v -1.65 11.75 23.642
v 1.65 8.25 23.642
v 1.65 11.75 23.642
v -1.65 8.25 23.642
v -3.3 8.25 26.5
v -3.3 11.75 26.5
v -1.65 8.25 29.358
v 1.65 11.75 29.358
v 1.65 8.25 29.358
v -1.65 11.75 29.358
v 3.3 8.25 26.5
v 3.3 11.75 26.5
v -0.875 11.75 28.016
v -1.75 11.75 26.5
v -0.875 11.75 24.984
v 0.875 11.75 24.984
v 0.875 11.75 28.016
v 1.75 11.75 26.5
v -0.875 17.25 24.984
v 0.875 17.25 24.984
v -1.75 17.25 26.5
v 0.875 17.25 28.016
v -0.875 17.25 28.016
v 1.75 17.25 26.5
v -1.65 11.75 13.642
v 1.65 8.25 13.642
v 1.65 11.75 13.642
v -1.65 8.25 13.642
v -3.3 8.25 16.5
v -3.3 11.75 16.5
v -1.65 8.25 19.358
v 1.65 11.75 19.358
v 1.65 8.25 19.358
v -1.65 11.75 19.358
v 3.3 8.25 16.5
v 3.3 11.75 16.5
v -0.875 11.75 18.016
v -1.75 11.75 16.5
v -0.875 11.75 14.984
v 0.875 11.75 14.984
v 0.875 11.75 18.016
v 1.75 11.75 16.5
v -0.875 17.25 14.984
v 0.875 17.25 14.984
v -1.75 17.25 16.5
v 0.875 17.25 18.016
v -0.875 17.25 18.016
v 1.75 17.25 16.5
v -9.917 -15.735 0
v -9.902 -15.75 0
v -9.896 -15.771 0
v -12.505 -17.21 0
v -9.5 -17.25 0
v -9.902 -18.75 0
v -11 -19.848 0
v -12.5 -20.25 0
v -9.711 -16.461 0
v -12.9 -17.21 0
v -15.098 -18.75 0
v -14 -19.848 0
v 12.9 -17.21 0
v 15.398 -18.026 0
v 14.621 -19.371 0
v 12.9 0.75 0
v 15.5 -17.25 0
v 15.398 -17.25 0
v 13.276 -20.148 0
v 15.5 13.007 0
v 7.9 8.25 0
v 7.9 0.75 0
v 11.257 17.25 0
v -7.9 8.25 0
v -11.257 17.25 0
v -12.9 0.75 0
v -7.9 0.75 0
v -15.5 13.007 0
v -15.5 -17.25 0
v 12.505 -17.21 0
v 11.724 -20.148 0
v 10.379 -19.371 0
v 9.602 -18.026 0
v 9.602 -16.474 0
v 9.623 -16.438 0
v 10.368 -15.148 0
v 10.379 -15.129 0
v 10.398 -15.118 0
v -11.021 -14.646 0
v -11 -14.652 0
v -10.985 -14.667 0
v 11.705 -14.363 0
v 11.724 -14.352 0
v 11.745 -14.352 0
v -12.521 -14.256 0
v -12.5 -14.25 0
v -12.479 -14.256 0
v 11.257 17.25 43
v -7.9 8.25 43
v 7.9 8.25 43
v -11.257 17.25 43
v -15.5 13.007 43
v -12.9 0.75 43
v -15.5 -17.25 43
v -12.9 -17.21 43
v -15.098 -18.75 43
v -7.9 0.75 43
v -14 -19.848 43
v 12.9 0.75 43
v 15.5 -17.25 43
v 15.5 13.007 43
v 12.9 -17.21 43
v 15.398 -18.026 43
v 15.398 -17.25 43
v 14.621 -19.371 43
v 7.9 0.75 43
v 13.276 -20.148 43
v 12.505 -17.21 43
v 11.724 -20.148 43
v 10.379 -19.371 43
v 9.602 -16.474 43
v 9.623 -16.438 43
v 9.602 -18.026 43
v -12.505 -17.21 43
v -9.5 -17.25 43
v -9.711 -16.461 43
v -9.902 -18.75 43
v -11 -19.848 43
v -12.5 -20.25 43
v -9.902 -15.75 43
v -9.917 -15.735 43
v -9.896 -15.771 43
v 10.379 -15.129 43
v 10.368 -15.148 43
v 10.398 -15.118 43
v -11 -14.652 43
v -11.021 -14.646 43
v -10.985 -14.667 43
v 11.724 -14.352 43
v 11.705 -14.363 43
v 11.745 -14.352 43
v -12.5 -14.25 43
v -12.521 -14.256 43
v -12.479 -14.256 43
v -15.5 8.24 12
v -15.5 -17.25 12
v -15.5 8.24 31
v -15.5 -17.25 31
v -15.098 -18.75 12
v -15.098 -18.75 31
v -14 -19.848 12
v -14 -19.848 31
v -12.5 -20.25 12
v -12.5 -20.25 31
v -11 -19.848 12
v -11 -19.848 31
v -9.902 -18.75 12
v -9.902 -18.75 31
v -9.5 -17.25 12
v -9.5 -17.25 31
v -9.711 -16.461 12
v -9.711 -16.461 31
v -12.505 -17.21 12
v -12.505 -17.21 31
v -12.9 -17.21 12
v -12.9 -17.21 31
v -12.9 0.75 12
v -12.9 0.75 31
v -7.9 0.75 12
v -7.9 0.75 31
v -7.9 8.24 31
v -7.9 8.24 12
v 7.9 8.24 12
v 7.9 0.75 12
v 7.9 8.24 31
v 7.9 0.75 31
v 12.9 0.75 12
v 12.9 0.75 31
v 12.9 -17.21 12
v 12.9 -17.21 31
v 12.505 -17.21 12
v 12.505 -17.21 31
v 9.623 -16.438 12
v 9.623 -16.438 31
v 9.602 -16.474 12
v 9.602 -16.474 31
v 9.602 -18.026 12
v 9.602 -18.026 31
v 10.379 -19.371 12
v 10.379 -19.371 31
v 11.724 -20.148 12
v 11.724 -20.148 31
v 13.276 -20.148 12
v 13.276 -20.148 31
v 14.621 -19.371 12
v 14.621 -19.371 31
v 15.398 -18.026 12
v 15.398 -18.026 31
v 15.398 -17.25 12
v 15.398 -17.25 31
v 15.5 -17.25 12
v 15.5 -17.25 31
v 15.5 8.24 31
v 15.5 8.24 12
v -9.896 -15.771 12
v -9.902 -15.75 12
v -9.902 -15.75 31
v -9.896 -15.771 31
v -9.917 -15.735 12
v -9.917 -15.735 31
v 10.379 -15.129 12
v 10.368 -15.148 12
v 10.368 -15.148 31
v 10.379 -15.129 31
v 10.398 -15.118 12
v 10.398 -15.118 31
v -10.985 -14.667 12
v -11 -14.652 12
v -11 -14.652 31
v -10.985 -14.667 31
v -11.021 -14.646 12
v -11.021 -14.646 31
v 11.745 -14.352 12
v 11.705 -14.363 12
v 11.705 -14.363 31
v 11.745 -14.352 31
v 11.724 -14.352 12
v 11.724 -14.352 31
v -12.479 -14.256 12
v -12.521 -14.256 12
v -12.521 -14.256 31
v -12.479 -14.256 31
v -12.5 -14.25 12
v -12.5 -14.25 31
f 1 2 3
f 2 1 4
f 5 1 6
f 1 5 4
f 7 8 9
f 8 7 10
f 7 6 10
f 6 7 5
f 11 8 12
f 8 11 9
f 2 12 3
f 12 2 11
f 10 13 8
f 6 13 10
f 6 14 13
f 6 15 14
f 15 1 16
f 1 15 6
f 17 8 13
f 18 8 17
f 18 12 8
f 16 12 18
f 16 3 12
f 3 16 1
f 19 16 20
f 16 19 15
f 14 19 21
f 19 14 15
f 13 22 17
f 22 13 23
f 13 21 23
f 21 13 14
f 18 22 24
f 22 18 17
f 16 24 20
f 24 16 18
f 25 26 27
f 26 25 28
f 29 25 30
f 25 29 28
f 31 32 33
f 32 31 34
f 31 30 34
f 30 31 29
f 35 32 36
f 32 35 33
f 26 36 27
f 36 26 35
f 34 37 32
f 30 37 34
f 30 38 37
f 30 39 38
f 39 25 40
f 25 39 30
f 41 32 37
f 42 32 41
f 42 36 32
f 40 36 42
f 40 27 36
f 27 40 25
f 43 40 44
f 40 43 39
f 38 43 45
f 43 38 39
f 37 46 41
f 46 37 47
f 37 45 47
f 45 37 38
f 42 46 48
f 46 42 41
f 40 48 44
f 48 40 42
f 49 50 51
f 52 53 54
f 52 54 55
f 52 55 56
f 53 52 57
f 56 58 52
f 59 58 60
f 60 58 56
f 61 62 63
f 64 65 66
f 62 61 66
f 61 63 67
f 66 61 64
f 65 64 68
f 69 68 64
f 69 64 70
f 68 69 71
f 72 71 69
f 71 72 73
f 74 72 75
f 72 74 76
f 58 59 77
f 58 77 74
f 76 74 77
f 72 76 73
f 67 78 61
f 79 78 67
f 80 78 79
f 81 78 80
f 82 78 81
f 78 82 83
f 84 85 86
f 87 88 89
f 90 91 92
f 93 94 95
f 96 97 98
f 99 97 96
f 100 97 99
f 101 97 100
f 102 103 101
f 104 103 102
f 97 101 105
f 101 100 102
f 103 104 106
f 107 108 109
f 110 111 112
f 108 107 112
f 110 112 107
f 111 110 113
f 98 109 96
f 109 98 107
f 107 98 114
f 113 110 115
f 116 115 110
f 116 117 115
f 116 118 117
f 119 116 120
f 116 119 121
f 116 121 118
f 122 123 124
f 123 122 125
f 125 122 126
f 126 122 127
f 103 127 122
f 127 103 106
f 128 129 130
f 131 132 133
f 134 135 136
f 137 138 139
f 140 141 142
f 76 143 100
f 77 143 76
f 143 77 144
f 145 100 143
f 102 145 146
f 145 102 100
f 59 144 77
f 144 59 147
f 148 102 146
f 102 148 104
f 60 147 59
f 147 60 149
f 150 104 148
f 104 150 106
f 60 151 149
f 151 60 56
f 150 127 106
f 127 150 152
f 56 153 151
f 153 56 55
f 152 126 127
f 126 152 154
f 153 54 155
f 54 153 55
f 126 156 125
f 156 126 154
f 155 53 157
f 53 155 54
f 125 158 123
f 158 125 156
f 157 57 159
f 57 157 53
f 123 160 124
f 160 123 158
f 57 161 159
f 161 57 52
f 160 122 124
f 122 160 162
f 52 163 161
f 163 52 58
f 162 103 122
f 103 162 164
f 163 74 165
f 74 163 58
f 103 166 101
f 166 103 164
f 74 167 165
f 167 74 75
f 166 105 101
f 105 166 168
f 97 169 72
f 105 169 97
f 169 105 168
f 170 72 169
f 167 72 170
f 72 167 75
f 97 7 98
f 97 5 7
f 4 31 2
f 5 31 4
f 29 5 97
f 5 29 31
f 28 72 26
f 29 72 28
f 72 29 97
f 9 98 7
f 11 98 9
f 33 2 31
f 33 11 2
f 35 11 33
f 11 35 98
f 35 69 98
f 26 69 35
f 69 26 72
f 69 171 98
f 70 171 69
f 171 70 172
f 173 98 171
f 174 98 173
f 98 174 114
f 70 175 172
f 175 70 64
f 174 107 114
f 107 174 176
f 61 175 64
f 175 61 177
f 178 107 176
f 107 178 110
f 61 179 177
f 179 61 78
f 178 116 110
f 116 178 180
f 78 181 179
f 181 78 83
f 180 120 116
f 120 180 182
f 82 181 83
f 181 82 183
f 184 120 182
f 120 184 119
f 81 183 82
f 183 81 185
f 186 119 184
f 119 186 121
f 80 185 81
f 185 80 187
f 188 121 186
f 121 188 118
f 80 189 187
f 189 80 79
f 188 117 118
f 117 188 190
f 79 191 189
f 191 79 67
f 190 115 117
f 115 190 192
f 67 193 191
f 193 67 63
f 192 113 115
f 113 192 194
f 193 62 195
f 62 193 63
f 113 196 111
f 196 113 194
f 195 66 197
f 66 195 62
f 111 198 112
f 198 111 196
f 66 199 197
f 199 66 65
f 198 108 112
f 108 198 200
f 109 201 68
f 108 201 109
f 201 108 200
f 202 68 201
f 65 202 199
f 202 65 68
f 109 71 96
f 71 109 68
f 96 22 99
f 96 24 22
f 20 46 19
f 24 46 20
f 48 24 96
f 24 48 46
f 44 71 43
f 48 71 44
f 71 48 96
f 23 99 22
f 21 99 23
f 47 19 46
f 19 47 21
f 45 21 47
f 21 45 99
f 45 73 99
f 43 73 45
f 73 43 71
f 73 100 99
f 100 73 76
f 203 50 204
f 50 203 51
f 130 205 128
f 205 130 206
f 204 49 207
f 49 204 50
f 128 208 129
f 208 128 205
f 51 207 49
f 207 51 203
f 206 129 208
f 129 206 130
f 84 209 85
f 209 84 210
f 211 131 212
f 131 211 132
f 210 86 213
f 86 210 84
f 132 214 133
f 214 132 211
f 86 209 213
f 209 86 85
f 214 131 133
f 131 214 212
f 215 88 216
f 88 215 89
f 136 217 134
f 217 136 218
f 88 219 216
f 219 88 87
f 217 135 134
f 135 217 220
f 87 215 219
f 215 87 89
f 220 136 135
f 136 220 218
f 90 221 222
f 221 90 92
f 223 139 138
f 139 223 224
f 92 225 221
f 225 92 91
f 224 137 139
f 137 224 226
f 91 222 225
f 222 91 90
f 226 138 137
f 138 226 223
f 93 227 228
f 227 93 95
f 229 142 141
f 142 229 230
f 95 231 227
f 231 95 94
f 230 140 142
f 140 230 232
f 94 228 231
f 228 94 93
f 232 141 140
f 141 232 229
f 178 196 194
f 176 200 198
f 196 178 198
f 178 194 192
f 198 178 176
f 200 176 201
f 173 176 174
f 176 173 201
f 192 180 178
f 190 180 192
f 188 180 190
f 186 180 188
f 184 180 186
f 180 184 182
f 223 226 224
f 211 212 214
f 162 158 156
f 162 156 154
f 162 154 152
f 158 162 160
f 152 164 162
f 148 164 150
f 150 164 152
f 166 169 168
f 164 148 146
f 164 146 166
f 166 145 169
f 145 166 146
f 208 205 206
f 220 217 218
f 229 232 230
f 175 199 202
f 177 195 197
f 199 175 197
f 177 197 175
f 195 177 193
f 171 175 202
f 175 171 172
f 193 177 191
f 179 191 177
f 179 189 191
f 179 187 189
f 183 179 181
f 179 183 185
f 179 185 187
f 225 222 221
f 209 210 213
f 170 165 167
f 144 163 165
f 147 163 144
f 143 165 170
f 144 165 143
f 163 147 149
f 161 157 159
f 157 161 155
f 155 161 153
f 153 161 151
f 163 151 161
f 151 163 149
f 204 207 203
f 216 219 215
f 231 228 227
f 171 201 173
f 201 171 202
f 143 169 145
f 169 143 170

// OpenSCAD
// Air vent mount for my Samsung Galaxy S / Nexus 4 holders
// by Len Trigg <lenbok@gmail.com>

// Mount for air vent grill. Adust these as needed


// Outer height of two horizontal vent slats. Total height will be this plus two prong thicknesses
VentSlatsHeight = 25.8;  

// Thickness of prongs holding onto slats (higher = stronger)
VentProngThickness = 2.6;  

// Depth of prongs into air vent slats
VentProngDepth = 18;      

// Width of each of the prongs protruding into air vent
VentProngWidth = 12;   

// How much the hook end of the prong sticks out, i.e. grippiness
VentProngHookRad = 3;  

// Thickness of the plate that bolts to phone mount
MountPlateThickness = 9;     

// Extra rebate for clearing the vent direction adjustment thingy
MountPlateExtraThickness = 7.5;  

// Total width of the mount
TotalMountWidth = 43;

// Include support
Support = "no";  // [yes,no]

module bolthole(r1=2, r2=4, h1=10, h2=10) {
    sinkheight = r2 - r1;
    cylinder(r = r1, h = h1 + 0.01);
    translate([0, 0, h1]) cylinder(r = r2, h = h2);
}

// Mounting point characteristics
// Must match the phone holder parts, so probably don't mess with them
screwSeparation = 10;
screwRad = 3.5/2;
screwDepth = 10;
screwHeadRad = 6.6/2;
screwHeadDepth = 3.5;

sthick=0.3; // Thickness of support layer. This should be set to the printed layer thickness


fudge = 0.01;
module wedge(r = 7, a = 225) {
    if (a <= 180) {
        difference() {
            circle(r = r);
            translate([-fudge, -r-fudge]) square([r*2+0.1, r*2+0.1], center=true);
            rotate([0,0,a]) translate([-fudge, r+fudge]) square([r*2+0.1, r*2+0.1], center=true);
        }
    }
    if (a > 180) {
        difference() {
            circle(r = r);
            rotate([0,0,a]) wedge(r = r +0.1, a = 360 - a);
        }
    }
}


ventmountw=VentSlatsHeight+2*VentProngThickness;  // Outer width of mount (i.e. height when attached to vent)
ventmounth=VentProngDepth+MountPlateThickness+MountPlateExtraThickness; // Total front to back of mount
module ventmountprofile() {
    difference() {
        union() {
            square([ventmountw,ventmounth]);
            //translate([VentProngThickness,ventmounth]) rotate([0,0,45]) square([VentProngHookRad*2,VentProngHookRad*2],center=true);
            //translate([ventmountw-VentProngThickness,ventmounth]) rotate([0,0,-45]) square([VentProngHookRad*2,VentProngHookRad*2],center=true);
        }
        translate([VentProngThickness+5, MountPlateThickness]) square([ventmountw-2*VentProngThickness-10,ventmounth-MountPlateThickness]);
        translate([VentProngThickness, MountPlateThickness+MountPlateExtraThickness]) square([ventmountw-2*VentProngThickness,ventmounth-(MountPlateThickness+MountPlateExtraThickness)+0.1]);
        translate([0,0]) rotate([0,0,45]) square([VentProngHookRad*2,VentProngHookRad*2],center=true);
        translate([ventmountw,0]) rotate([0,0,45]) square([VentProngHookRad*2,VentProngHookRad*2],center=true);

    }
    translate([VentProngHookRad,ventmounth]) rotate([0,0,-15]) wedge(r=VentProngHookRad,center=true,$fn=12,a=195);
    translate([ventmountw-VentProngHookRad,ventmounth]) rotate([0,0,0]) wedge(r=VentProngHookRad,center=true,$fn=12,a=195);
}

supporth=MountPlateExtraThickness+VentProngDepth+VentProngHookRad;
module ventmount() {
    sw=2;
    sf=5;
    translate([-ventmountw/2,0,0]) {
        difference() {
            linear_extrude(height=TotalMountWidth) ventmountprofile();
            // Nut holes
            translate([ventmountw/2, MountPlateThickness+0.01, TotalMountWidth/2 + screwSeparation/2]) rotate([90,0,0]) bolthole(r2=screwRad,r1=screwHeadRad, h2=screwDepth,h1=screwHeadDepth,$fn=6);
            translate([ventmountw/2, MountPlateThickness+0.01, TotalMountWidth/2 - screwSeparation/2]) rotate([90,0,0]) bolthole(r2=screwRad,r1=screwHeadRad, h2=screwDepth,h1=screwHeadDepth,$fn=6);
            translate([-ventmountw/2, MountPlateThickness+0.01, VentProngWidth]) cube([ventmountw*2, ventmounth, TotalMountWidth-2*VentProngWidth]);
        }
    }
    if (Support == "yes") {
        for (m = [0,1]) {
            mirror([m,0,0]) {
                translate([ventmountw/2-12-sf, MountPlateThickness+1, 0]) cube([sf, supporth, 0.5]);
                translate([ventmountw/2-12, MountPlateThickness+1, 0]) cube([sw, supporth, TotalMountWidth-VentProngWidth]);
                translate([ventmountw/2-12, MountPlateThickness+1, TotalMountWidth-VentProngWidth-sthick]) cube([15, supporth, sthick]);
                translate([ventmountw/2+1, MountPlateThickness+1, 0]) cube([sw, supporth, TotalMountWidth-VentProngWidth]);
                translate([ventmountw/2+1, MountPlateThickness+1, 0]) cube([sw+sf, supporth, 0.5]);
            }
        }
   }
}

translate([0,ventmounth/2,0]) rotate([0,0,180]) ventmount();
